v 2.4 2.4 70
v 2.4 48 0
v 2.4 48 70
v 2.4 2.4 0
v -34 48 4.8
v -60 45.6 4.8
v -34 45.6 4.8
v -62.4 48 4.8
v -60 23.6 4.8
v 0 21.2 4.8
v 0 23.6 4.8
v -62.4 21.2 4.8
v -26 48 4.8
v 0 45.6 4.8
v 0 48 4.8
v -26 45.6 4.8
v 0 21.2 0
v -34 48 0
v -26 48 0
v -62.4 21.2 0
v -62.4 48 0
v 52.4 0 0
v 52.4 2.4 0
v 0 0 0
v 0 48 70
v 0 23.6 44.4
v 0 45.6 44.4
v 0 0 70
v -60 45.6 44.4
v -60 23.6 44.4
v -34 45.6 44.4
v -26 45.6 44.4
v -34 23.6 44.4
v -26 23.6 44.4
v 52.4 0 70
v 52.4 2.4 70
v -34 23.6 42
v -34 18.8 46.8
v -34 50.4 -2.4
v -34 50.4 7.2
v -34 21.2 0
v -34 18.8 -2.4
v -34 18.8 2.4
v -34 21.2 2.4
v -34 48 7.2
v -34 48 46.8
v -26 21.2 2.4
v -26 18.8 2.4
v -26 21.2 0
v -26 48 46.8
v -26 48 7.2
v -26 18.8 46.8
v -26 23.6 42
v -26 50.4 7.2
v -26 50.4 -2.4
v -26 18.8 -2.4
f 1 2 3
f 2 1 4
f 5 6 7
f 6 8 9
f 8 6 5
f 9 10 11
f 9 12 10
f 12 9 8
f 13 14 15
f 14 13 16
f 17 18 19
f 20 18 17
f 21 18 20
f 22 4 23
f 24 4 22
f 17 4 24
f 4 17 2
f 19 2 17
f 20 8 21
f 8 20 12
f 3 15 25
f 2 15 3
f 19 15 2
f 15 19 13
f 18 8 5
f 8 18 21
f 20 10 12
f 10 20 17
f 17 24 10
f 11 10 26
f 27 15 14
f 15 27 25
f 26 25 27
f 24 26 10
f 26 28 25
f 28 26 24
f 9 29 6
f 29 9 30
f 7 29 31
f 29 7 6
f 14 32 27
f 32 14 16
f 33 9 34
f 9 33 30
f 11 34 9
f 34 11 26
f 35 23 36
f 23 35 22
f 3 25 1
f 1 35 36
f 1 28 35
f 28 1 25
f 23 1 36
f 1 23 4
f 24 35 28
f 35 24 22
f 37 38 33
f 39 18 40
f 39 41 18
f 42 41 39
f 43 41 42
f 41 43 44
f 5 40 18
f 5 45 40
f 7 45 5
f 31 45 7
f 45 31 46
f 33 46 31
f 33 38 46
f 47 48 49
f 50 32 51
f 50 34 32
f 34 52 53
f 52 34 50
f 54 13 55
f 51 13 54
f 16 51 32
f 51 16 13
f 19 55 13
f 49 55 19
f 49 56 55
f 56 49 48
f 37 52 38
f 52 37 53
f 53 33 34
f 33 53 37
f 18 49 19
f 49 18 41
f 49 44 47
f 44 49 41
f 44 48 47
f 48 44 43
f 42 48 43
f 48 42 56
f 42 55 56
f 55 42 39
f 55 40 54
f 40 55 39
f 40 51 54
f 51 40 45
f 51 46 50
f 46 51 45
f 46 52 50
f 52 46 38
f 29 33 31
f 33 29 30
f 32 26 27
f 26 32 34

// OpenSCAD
//Stable and fast to print gopro-style camera holder for a phone gimbal
//The camera protrudes forward, so the gimbal itself is not in the frame
//Designed for GoPro 4 Silver and Osmo Mobile, but can be customized for your dimensions
part="visualisation"; //[holder,bracket,visualisation]
//how far to the front the camera protrudes
offset=48;
//width of gimbal jaws
width=50;
//gimbal jaws opening
height=70;
//thickness of the parts
wall=2.4;
//dimensions of the camera
camera=[60,22,42];
//size of the latch for clipping the camera
latch=2.4;
//width of space between the lens and front screen
bracket_width=8;
module holder(offset=48,width=50,height=70,wall=2.4,camera=[60,22,42]) {
  translate([wall,0,0])cube([width,wall,height]);
  cube([wall,offset,height]);
  difference() {
    translate([-camera[0]-wall,offset-camera[1]-wall*2,0])cube([camera[0]+2*wall,camera[1]+2*wall,wall*2]);
    translate([-camera[0],offset-camera[1]-wall,wall])cube(camera);
  }
}
module bracket(wall=2.4,camera=[60,22,42],latch=2.4,bracket_width=4) {
  linear_extrude(height=bracket_width) {
  square([wall,2*wall]);
  translate([camera[1]+3*wall,0])square([wall,4*wall]);
  translate([camera[1]+2*wall,3*wall])square([wall,camera[2]]);
  translate([wall,0,])square([camera[1]+2*wall,wall]);
  translate([2*wall,camera[2]+2*wall])square([camera[1],wall]);
  translate([2*wall,camera[2]+3*wall])polygon([[0,0],[-latch-wall,0],[0,-latch-wall]]);
    }
}
if (part=="holder") holder(offset=offset,width=width,height=height,wall=wall,camera=camera);
if (part=="bracket") bracket(wall=wall,camera=camera,latch=latch,bracket_width=bracket_width);
if (part=="visualisation") {
color([0.5,0.5,1])holder(offset=offset,width=width,height=height,wall=wall,camera=camera);
color([0.5,1,0.5])translate([-camera[0]/2-bracket_width/2,offset-camera[1]-3*wall,-wall])rotate([90,0,90])bracket(wall=wall,camera=camera,latch=latch,bracket_width=bracket_width);
color([1,0.5,0.5])translate([-camera[0],offset-camera[1]-wall,wall])cube(camera);
}
